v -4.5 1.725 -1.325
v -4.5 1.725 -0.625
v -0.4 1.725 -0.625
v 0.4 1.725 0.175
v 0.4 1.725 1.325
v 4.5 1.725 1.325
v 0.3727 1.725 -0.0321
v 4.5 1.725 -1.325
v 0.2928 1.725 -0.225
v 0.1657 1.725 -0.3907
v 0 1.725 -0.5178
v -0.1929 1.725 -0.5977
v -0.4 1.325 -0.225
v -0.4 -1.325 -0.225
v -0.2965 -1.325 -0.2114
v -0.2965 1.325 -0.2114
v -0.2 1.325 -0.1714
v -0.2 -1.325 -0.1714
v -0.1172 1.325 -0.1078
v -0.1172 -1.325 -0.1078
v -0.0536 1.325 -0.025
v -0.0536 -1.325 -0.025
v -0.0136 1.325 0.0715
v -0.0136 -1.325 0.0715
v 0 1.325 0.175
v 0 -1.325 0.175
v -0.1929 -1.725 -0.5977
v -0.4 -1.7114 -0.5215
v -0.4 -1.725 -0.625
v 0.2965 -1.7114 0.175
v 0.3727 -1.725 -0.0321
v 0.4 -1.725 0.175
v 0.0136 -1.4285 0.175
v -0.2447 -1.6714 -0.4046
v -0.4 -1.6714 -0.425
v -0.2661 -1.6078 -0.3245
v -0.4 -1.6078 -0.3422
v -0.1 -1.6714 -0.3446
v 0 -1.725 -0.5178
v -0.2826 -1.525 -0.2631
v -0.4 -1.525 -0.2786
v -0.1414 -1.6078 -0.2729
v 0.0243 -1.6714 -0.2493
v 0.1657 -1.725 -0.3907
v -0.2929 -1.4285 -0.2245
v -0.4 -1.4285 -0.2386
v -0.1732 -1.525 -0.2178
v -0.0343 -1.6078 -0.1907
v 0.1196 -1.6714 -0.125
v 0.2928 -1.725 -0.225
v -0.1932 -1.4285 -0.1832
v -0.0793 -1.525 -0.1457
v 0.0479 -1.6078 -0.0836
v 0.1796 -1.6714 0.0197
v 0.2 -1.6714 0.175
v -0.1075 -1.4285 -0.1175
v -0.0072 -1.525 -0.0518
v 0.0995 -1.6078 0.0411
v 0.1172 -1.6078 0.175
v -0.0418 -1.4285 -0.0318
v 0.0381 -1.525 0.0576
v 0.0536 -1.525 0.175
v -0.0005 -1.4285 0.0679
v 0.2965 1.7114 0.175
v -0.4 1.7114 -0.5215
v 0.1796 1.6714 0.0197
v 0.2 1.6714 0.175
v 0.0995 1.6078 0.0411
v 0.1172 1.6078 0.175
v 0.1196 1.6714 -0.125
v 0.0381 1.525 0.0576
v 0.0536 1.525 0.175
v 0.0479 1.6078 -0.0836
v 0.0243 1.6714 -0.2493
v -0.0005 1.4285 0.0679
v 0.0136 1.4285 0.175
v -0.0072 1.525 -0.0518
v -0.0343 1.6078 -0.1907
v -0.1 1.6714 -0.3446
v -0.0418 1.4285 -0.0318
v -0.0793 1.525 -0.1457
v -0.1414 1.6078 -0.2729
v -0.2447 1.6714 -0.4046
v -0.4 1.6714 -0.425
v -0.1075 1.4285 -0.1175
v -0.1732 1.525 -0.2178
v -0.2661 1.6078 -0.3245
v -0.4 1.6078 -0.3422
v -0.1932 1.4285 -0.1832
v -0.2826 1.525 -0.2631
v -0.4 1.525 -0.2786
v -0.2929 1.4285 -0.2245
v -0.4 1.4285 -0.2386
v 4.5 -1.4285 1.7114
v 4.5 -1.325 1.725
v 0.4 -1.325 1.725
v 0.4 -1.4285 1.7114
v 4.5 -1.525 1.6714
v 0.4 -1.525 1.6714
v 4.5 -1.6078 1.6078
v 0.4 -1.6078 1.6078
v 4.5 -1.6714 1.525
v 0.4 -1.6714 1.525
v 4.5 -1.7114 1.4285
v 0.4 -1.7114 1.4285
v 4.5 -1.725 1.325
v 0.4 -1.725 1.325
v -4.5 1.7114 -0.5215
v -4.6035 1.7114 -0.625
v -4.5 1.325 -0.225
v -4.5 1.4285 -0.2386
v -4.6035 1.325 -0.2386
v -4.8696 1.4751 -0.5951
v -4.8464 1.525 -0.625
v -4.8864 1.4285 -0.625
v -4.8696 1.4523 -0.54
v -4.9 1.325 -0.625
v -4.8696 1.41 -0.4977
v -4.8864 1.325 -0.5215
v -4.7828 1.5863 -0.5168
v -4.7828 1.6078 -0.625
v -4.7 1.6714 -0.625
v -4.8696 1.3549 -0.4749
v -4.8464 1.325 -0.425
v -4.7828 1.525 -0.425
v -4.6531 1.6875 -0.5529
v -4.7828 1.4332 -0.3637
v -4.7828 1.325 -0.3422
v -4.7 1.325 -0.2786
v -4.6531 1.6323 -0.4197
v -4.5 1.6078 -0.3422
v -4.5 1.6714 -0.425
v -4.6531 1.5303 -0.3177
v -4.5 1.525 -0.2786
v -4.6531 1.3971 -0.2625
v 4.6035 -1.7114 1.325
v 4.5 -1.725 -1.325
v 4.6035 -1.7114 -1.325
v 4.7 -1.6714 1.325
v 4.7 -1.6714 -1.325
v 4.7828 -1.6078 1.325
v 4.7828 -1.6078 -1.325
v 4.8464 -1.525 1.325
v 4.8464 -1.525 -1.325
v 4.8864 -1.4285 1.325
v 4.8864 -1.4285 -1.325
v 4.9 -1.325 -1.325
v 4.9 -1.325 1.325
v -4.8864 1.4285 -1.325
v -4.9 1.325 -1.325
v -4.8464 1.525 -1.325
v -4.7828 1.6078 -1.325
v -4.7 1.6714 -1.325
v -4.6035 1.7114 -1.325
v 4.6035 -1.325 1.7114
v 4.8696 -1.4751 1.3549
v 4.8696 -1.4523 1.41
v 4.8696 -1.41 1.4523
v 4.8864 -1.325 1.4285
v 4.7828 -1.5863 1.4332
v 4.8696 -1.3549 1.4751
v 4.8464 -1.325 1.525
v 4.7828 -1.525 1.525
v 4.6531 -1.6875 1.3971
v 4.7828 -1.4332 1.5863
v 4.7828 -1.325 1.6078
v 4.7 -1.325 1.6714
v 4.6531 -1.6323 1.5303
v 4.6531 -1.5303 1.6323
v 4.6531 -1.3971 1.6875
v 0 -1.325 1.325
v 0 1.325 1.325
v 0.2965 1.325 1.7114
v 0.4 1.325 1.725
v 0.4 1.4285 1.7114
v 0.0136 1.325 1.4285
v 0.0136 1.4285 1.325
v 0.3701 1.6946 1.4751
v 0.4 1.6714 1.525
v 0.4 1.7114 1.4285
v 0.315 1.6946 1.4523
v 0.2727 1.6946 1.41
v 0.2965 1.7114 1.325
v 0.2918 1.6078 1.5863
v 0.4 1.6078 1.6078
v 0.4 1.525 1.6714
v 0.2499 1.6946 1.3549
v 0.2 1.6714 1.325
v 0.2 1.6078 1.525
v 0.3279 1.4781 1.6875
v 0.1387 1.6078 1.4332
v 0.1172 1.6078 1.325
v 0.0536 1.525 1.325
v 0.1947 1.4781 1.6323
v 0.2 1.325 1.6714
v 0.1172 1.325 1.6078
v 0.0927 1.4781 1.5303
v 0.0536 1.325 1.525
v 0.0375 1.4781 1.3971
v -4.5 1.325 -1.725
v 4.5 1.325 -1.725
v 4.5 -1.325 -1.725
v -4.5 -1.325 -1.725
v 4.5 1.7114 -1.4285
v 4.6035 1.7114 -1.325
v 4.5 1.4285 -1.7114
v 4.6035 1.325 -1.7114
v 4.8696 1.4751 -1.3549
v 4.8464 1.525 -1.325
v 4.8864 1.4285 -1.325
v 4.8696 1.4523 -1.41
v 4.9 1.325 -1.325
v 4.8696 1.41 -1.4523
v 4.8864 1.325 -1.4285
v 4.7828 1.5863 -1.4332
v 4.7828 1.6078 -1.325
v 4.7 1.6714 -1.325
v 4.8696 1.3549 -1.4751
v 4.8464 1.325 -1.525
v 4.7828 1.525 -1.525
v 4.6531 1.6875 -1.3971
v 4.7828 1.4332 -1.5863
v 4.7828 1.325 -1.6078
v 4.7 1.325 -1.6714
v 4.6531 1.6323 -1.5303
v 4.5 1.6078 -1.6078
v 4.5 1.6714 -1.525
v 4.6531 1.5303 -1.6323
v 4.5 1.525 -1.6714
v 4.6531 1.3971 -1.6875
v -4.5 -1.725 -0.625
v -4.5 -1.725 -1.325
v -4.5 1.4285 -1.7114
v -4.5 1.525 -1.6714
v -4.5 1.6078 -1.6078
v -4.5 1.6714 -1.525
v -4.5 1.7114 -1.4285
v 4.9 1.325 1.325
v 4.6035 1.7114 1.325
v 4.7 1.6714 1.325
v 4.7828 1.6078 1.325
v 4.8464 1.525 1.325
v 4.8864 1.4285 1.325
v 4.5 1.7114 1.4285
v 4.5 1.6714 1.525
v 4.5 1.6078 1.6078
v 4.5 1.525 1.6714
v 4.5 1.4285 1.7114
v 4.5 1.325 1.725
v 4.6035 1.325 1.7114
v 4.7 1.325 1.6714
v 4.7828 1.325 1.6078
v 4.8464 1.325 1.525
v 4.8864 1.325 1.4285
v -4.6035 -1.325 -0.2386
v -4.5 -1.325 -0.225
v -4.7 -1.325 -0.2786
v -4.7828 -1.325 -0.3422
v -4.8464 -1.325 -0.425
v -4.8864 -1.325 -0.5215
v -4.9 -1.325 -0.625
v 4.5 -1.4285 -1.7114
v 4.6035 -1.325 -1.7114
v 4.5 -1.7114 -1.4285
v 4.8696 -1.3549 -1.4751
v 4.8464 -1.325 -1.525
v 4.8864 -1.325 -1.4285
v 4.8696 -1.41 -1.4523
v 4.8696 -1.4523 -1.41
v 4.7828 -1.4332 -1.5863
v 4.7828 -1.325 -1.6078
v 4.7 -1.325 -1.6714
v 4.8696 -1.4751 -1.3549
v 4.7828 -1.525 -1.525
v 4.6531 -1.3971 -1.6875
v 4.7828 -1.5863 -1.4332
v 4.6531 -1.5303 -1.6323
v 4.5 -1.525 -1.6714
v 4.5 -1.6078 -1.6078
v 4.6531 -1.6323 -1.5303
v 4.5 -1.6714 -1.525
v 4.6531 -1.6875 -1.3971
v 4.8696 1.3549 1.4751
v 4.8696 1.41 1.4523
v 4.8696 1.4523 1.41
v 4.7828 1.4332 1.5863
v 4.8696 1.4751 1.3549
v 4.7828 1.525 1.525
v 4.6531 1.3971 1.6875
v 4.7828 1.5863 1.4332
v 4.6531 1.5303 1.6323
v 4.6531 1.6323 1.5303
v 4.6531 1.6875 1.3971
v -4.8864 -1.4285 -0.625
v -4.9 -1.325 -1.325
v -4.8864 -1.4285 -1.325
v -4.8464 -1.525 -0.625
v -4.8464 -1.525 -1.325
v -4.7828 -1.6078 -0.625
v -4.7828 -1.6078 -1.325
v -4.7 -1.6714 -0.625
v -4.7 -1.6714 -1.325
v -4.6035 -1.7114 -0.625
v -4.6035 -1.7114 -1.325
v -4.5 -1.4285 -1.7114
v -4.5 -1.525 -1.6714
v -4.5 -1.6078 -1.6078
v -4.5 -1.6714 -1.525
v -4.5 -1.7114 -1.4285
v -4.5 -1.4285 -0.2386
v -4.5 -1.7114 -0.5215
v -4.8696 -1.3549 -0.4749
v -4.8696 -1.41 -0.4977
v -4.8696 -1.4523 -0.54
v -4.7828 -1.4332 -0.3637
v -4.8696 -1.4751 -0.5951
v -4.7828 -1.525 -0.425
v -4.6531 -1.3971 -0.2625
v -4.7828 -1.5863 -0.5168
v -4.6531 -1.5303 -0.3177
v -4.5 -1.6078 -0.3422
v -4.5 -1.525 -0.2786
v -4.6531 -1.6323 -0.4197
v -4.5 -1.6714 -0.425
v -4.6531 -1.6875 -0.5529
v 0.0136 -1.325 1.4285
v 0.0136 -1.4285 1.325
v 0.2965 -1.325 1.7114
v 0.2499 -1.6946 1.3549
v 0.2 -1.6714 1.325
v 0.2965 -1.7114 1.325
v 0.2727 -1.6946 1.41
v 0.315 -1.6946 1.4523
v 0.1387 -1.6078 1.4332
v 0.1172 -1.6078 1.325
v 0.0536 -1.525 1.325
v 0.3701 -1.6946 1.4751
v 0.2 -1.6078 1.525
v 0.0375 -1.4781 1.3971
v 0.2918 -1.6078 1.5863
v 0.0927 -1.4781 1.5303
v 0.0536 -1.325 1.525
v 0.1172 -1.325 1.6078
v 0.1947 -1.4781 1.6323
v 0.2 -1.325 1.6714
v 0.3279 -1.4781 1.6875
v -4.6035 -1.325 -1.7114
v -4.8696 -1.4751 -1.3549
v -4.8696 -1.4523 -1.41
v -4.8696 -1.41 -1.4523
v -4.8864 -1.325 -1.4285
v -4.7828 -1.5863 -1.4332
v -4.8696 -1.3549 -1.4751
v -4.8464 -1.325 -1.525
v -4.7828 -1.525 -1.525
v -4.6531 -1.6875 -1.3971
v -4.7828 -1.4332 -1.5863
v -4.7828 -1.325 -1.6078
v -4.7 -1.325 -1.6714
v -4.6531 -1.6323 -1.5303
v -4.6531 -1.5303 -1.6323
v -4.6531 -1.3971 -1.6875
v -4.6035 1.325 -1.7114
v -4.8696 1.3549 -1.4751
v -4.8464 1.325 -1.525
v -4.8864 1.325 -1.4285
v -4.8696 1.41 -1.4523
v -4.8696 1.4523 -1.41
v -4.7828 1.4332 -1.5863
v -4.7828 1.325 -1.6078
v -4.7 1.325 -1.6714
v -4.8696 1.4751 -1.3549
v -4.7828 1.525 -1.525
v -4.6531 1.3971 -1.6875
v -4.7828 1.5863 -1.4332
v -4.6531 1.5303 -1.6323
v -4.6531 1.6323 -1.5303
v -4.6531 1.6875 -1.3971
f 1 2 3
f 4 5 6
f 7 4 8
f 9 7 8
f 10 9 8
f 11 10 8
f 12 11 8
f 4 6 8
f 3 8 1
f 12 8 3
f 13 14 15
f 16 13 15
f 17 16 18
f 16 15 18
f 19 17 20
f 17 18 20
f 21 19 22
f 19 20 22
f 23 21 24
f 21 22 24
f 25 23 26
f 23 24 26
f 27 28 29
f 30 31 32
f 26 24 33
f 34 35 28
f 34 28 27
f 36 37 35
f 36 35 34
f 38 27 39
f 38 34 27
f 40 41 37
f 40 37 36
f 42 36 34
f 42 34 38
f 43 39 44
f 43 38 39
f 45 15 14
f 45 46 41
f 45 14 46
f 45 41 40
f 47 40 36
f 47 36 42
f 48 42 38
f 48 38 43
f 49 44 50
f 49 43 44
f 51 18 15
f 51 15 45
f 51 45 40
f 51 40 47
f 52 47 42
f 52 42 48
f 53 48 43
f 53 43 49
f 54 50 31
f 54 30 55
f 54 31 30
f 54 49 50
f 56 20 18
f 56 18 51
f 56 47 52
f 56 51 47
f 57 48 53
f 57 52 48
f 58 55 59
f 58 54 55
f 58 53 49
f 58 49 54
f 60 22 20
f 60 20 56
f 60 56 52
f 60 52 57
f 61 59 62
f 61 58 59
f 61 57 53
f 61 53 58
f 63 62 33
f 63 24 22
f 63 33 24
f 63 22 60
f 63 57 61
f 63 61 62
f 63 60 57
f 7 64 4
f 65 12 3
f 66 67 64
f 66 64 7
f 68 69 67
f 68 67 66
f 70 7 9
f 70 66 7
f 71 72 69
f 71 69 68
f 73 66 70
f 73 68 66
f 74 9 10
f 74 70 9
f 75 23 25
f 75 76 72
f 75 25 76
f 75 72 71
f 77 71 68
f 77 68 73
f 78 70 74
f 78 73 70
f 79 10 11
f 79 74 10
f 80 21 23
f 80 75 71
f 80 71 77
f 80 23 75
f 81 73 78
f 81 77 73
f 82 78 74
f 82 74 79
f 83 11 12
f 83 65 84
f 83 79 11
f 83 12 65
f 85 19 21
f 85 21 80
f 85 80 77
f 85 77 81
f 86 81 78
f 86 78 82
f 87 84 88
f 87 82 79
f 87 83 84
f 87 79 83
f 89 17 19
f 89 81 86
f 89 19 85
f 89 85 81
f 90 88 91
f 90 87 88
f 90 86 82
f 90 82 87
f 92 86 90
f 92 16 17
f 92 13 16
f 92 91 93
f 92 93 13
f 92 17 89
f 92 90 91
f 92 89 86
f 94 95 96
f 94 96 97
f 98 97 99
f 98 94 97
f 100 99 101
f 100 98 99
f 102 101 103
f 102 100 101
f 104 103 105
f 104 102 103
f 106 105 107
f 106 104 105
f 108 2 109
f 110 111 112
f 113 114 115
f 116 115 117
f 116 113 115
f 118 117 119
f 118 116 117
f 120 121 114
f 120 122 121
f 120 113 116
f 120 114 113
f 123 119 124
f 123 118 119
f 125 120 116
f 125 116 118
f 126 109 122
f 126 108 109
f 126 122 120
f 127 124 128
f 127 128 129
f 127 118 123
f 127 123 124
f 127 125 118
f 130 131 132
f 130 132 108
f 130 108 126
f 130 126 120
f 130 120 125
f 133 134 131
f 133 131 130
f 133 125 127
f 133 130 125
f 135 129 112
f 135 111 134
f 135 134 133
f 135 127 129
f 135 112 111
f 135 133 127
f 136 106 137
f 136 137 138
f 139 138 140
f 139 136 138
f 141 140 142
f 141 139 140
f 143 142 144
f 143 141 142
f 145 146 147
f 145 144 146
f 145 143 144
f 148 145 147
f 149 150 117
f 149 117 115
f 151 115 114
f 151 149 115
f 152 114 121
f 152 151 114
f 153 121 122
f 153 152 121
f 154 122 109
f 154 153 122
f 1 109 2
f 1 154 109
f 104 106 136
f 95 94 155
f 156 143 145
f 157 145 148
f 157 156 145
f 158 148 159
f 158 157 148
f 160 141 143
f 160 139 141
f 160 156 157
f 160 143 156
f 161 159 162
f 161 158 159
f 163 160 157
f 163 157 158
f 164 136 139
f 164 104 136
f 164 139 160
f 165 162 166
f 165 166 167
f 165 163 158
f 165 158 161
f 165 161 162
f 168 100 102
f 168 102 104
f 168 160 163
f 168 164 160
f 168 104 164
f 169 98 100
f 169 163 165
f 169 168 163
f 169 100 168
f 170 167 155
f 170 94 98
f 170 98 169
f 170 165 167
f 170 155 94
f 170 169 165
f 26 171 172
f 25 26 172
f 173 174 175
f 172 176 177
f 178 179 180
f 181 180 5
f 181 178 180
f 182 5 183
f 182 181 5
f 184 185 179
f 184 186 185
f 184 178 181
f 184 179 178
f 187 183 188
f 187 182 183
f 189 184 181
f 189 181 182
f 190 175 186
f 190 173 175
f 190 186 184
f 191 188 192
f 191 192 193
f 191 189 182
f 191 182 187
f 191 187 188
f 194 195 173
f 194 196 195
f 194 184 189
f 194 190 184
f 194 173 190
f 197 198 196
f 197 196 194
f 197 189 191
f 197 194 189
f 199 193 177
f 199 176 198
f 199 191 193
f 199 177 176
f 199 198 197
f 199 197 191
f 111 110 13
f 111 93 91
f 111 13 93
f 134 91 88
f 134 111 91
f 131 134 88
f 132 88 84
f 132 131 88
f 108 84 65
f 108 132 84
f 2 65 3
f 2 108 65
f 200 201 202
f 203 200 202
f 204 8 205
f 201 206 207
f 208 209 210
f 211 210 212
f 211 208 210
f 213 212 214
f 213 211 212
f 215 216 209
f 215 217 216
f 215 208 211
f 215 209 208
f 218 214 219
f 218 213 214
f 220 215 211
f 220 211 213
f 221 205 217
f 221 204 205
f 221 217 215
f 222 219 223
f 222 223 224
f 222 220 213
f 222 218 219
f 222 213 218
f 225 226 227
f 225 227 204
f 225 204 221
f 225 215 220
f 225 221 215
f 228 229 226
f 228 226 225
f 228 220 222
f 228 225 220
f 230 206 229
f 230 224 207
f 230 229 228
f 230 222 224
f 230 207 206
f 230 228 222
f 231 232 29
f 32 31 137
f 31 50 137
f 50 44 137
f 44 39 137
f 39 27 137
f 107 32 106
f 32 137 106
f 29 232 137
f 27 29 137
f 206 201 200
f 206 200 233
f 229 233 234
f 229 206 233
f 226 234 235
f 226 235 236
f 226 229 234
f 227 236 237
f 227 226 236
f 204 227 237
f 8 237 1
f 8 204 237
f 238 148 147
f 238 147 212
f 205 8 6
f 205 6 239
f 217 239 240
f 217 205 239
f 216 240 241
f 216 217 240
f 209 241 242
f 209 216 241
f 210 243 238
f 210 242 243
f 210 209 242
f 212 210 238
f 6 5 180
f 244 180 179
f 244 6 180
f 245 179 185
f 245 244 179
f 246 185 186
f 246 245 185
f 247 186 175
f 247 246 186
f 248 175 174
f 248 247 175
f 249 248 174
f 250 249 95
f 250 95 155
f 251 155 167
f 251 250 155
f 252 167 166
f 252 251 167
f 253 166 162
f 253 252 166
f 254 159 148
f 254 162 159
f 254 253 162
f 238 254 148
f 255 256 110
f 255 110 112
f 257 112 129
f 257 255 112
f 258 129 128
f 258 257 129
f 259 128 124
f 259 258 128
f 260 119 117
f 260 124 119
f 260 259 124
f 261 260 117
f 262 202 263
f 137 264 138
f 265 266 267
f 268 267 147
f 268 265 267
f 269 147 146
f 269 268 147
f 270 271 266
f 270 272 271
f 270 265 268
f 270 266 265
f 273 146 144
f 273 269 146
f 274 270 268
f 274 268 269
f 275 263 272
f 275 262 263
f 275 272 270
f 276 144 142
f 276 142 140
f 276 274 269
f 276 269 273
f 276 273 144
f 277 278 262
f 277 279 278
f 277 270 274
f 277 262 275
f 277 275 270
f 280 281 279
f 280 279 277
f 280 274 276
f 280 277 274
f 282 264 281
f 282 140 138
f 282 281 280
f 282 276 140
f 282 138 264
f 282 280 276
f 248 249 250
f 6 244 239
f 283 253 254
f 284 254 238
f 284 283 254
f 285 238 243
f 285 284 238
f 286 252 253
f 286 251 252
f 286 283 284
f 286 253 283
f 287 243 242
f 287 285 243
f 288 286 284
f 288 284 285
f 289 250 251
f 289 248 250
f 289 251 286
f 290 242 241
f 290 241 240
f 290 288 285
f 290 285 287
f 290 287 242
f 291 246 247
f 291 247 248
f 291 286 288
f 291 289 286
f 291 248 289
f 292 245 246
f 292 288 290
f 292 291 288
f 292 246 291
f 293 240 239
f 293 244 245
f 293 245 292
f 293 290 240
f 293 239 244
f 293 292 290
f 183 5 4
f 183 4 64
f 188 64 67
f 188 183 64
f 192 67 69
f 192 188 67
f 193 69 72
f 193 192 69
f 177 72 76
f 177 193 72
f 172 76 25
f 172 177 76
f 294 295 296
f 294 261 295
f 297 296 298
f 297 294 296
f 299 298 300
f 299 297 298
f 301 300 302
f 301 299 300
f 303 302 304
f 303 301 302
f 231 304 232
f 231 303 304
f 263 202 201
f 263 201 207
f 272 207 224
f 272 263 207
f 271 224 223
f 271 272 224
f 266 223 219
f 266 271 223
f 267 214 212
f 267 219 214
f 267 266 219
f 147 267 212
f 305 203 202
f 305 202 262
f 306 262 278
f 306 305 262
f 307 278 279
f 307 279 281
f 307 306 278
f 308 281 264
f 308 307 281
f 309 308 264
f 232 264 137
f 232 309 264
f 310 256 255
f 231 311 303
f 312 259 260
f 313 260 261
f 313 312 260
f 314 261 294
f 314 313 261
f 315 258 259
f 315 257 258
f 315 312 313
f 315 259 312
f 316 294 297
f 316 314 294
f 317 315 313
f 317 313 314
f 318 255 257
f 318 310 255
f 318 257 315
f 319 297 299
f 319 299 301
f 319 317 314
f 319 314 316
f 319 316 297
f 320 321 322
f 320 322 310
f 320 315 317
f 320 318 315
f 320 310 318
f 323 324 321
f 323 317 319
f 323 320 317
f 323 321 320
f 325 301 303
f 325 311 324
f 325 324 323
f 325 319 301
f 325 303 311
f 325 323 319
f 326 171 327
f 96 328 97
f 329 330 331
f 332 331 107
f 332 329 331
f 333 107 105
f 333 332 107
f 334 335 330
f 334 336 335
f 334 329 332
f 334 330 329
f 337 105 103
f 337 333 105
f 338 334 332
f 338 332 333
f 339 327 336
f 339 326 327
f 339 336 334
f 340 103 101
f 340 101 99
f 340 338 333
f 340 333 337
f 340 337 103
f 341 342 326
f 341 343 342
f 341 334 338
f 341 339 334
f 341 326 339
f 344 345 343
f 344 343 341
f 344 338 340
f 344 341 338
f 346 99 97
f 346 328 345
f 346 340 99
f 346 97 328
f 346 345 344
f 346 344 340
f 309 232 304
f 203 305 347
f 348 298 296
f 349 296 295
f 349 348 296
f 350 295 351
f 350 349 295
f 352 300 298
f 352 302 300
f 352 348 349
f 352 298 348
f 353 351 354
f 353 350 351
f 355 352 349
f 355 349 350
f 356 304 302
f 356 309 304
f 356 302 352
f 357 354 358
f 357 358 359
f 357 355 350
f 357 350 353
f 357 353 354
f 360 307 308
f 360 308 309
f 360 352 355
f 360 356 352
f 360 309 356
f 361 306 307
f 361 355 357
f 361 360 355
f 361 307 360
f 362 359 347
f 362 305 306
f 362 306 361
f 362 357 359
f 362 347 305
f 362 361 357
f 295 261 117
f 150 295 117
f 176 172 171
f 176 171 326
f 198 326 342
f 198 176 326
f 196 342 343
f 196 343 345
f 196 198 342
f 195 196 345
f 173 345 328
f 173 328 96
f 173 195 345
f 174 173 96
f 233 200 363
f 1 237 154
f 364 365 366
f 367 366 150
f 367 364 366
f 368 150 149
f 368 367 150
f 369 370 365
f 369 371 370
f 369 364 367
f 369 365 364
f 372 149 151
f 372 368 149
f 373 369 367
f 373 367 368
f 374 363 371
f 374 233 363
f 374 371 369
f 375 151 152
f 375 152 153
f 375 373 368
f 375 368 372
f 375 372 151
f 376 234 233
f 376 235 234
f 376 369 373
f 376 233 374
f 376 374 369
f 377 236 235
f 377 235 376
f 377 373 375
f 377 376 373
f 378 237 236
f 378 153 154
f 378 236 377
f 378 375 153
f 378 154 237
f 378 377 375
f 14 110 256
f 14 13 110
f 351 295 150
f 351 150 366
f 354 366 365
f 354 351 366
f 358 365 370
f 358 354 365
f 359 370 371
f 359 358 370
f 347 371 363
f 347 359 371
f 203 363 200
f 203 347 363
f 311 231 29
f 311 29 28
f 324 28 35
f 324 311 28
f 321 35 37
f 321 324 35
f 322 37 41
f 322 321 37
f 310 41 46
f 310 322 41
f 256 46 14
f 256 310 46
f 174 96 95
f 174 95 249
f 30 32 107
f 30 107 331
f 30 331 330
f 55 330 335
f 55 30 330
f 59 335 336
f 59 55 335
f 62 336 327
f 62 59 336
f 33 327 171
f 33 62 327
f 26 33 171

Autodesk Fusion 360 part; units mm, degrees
sketch "Sketch1" plane through (0, 0, 0) normal (1, 0, 0) x (0, 1, 0)
  line L0 (1.725, -1.725) -> (-1.725, -1.725)
  line L1 (-1.725, -1.725) -> (-1.725, 1.725)
  line L2 (-1.725, 1.725) -> (1.725, 1.725)
  line L3 (1.725, 1.725) -> (1.725, -1.725)
  line L4 (1.725, -1.725) -> (-1.725, 1.725) construction
  line L5 (-1.725, -1.725) -> (1.725, 1.725) construction
  line L6 (-1.725, -1.725) -> (1.725, -1.725)
  line L7 (1.725, -1.725) -> (1.725, -0.225)
  line L8 (1.725, -0.225) -> (-1.725, -0.225)
  line L9 (-1.725, -0.225) -> (-1.725, -1.725)
  dimension "d1" = 3.45
  dimension "d2" = 3.45
  dimension "d7" = 1.5
extrude "Extrude1" add sketch "Sketch1" against normal blind 4.9 contours L0 L1 L3 L6 L7 L8 L9
extrude "Extrude3" add sketch "Sketch1" along normal blind 4.9
fillet "Fillet1" radius 0.4 10 edges at (-2.45, -1.725, -0.225) (-2.45, 1.725, -0.225) (0, 0, -0.225) (0, 0, 1.725) (0, -1.725, 0.75) (0, -1.725, -1.725) (2.45, -1.725, 1.725) (2.45, 1.725, 1.725) (0, 1.725, -1.725) (0, 1.725, 0.75) 2 faces at (4.9, -0.575, 0.575) (-4.9, 0.575, -1.225)
equation "d2 = d1"
